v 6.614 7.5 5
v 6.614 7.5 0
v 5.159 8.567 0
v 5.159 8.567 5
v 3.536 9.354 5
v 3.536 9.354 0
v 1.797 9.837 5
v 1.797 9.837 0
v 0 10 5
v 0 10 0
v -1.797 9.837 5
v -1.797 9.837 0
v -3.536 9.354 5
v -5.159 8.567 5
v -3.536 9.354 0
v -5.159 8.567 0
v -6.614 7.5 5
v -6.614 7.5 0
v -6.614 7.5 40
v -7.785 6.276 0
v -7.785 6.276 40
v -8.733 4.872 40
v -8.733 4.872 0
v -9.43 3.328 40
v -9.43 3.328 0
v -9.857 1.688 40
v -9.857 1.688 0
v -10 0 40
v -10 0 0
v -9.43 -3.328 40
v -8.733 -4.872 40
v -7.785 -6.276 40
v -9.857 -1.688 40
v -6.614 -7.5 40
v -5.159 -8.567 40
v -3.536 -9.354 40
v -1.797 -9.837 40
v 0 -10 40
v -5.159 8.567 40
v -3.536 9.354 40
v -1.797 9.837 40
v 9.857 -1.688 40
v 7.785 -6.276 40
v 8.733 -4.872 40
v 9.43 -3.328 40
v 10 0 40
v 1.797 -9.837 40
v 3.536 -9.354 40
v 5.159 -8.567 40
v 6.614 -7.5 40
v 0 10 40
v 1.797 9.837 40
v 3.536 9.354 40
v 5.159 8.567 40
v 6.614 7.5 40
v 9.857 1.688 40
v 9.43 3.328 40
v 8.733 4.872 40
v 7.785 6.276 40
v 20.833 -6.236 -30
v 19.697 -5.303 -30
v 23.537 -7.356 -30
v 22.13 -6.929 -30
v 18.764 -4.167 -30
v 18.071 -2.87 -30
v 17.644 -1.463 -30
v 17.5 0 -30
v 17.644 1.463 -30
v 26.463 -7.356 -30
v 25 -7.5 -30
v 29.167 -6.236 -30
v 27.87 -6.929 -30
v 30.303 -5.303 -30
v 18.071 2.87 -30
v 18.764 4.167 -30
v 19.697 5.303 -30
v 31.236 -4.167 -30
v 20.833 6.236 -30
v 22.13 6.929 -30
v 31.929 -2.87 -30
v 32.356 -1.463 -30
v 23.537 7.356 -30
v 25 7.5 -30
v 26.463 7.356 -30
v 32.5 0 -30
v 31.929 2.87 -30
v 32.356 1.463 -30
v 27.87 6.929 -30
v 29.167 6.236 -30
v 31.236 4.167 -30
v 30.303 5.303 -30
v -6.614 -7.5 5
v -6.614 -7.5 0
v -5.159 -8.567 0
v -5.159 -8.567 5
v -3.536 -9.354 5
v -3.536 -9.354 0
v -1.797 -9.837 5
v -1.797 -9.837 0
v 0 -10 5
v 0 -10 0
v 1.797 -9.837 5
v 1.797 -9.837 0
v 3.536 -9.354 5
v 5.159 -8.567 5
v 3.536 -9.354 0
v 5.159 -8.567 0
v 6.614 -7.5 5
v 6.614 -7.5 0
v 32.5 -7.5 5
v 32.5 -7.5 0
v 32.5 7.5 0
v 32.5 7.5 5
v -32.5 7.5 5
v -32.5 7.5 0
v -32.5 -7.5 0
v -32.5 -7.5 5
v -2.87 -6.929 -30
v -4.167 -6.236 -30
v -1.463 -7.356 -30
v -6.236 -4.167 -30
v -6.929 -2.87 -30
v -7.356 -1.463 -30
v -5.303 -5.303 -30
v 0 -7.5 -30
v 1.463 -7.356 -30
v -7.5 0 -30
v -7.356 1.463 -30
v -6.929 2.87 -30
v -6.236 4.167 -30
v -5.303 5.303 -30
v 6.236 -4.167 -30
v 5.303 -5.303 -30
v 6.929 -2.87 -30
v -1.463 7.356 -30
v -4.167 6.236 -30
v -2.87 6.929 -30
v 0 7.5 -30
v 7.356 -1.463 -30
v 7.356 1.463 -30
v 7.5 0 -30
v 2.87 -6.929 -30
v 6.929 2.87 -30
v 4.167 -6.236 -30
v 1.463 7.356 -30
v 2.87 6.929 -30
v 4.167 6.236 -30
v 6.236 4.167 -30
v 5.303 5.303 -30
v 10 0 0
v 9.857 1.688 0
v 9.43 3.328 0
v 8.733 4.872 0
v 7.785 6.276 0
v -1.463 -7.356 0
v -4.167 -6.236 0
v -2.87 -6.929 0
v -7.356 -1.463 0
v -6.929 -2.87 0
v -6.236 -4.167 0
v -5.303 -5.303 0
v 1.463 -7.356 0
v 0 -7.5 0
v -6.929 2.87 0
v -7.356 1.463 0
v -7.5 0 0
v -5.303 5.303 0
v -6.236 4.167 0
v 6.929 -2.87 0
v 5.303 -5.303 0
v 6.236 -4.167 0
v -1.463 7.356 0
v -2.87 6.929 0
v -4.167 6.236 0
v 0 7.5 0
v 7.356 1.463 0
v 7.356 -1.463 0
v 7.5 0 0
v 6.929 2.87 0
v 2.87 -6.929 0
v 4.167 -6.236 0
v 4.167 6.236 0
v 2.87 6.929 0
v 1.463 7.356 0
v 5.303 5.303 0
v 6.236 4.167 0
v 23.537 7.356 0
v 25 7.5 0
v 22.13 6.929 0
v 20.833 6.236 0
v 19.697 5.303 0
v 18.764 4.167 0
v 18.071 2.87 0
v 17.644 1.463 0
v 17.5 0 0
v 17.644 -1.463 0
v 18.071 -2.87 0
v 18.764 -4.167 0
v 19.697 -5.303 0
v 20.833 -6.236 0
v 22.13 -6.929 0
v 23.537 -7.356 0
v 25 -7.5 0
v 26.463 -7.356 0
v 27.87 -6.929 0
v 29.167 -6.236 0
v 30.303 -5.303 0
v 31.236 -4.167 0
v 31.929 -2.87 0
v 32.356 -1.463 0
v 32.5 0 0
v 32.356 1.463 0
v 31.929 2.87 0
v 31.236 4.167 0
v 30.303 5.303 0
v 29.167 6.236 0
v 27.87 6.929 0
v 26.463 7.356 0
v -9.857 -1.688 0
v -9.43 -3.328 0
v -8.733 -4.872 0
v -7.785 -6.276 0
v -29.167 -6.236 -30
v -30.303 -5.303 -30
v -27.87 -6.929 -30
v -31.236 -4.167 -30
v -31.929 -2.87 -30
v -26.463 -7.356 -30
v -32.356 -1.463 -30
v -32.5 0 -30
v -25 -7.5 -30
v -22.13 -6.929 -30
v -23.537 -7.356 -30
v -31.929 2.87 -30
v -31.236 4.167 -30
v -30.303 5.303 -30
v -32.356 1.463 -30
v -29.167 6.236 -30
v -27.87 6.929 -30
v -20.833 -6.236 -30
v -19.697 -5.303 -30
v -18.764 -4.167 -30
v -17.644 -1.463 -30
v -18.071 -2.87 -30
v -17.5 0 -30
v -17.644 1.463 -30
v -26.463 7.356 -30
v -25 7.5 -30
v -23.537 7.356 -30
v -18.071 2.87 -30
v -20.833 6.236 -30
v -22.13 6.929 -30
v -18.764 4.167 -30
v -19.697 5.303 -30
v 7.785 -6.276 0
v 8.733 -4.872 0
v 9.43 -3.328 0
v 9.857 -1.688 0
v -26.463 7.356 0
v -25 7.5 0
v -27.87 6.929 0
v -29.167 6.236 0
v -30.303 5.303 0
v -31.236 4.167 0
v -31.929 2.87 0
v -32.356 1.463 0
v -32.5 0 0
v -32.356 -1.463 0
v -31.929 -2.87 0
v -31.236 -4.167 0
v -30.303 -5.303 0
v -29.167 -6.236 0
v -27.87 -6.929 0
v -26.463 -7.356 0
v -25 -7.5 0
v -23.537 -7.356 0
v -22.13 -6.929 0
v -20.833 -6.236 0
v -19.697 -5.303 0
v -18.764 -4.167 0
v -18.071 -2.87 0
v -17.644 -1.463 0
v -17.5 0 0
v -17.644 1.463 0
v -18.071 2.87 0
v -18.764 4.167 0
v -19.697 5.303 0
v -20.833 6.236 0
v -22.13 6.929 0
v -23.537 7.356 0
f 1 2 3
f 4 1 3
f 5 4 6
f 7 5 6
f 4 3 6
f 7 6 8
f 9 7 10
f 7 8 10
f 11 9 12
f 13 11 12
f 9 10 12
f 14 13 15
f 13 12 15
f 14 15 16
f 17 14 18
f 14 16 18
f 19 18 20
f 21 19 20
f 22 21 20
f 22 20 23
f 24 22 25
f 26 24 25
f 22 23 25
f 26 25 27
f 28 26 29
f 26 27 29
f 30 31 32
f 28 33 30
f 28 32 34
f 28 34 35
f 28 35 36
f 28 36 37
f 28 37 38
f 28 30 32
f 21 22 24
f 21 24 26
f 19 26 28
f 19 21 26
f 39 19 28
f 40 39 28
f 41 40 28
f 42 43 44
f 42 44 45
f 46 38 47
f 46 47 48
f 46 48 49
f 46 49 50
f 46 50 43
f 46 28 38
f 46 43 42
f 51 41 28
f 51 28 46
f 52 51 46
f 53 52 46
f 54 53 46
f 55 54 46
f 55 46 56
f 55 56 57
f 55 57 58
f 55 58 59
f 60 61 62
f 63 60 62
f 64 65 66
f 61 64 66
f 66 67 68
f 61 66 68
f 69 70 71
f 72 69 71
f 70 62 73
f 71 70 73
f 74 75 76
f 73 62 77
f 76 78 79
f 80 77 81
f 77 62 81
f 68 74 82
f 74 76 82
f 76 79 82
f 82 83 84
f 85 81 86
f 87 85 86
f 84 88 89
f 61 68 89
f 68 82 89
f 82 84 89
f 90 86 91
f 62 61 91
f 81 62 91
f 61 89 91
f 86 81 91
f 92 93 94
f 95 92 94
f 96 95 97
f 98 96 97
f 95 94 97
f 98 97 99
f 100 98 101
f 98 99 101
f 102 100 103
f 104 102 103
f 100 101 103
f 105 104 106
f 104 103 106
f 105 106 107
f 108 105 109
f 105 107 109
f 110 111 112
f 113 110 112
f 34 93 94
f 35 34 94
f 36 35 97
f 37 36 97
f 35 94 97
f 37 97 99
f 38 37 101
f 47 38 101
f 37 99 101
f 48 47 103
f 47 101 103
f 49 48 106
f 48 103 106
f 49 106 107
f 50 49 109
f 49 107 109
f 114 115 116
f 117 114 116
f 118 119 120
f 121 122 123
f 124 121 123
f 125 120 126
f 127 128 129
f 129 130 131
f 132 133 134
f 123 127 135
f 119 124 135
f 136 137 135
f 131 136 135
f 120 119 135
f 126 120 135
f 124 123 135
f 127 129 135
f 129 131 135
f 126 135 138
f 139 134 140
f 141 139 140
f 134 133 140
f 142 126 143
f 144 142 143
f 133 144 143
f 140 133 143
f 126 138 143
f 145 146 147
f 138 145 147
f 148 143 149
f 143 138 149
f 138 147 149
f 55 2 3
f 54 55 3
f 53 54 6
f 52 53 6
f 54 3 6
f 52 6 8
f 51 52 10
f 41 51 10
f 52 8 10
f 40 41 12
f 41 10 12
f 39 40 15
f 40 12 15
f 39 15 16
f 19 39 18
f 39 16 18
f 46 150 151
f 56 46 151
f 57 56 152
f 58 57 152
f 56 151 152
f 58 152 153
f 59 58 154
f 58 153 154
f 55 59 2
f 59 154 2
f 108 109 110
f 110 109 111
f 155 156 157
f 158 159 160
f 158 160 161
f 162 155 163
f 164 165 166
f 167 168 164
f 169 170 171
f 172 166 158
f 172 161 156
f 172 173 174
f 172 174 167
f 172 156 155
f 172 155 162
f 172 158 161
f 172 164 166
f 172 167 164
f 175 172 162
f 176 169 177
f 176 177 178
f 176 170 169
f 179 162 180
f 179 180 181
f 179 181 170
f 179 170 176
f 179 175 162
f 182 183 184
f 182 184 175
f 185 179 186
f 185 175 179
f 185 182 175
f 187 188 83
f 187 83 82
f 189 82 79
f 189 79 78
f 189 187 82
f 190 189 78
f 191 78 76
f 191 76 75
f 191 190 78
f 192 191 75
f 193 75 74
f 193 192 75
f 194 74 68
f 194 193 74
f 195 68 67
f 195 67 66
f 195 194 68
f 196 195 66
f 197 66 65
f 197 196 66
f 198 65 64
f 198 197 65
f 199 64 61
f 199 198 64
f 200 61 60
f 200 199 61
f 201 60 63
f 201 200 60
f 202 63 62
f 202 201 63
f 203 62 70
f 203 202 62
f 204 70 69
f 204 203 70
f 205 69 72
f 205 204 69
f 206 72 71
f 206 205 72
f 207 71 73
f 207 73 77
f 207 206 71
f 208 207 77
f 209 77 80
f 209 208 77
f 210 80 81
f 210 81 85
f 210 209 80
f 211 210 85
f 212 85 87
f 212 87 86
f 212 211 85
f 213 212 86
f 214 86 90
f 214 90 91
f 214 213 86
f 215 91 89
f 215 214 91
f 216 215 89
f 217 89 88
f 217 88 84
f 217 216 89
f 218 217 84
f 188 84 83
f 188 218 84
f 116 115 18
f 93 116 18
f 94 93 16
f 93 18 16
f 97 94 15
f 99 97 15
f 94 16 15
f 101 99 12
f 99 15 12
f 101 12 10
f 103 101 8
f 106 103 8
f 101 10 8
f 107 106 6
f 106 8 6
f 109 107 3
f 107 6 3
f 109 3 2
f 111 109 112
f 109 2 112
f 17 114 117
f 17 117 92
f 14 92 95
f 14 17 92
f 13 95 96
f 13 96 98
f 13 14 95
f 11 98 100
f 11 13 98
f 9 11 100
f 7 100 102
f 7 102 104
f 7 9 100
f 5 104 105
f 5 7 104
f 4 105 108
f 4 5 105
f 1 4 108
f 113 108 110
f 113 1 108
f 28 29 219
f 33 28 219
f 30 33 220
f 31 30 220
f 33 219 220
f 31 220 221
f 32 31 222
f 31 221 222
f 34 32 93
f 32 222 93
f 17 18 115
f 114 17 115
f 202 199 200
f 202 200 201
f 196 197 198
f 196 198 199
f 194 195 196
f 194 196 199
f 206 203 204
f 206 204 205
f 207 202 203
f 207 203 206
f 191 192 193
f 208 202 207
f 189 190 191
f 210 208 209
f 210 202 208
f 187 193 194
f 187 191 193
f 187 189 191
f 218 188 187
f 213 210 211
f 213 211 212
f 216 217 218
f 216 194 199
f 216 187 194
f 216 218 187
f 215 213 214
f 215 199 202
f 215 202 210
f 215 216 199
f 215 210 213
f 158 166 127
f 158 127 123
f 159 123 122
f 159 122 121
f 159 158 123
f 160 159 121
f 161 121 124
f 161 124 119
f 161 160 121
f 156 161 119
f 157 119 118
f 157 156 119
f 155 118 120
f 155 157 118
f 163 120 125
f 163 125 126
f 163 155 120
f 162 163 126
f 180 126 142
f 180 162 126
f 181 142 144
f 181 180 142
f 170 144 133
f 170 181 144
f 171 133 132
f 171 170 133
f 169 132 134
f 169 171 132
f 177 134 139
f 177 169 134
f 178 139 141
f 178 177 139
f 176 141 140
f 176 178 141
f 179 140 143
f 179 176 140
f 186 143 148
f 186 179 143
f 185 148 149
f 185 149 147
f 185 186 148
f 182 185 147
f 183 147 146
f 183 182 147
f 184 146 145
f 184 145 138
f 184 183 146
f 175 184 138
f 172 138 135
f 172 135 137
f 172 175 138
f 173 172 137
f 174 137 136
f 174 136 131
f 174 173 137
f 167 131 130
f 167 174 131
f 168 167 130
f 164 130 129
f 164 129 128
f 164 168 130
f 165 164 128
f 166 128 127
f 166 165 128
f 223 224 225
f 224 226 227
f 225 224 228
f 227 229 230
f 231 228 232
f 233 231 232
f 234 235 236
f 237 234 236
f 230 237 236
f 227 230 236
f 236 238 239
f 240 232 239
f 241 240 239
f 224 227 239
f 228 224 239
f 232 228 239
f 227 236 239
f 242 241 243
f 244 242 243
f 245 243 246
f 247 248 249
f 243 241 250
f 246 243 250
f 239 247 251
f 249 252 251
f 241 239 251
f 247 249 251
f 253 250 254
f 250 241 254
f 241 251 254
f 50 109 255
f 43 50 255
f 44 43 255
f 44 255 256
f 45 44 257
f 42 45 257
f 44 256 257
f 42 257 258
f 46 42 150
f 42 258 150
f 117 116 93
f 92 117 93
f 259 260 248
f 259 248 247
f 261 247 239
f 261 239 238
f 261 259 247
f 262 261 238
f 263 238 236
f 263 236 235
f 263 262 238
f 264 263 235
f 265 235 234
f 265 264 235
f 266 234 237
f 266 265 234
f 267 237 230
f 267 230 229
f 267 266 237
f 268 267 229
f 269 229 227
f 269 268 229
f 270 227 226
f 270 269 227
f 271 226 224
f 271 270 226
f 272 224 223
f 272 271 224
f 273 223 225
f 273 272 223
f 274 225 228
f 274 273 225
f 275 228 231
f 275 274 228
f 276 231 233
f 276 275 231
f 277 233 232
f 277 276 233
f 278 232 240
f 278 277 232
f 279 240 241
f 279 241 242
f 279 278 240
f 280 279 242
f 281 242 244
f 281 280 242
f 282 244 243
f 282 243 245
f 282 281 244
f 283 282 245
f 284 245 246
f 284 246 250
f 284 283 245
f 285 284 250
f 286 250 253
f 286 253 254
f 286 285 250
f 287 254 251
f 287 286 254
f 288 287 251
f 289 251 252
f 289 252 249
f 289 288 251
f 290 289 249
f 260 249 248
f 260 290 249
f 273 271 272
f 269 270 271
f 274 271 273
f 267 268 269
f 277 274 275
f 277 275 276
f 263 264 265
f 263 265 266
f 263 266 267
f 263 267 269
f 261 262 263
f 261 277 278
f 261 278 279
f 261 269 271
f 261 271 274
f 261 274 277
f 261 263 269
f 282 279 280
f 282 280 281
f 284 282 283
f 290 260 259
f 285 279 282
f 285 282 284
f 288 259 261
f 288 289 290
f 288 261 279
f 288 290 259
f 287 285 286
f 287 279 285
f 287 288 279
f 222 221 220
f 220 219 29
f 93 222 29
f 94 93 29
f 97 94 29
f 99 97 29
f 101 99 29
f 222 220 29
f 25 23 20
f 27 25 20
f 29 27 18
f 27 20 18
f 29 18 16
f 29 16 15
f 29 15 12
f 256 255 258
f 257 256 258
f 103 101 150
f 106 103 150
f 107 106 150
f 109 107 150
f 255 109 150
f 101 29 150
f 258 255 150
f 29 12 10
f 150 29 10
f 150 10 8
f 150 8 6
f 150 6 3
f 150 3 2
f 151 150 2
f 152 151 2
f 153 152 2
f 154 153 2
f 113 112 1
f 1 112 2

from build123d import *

# Parameters (mm, degrees)
F1_DEPTH = 5
F2_DEPTH = 40
F3_DEPTH = 30


with BuildPart() as f1:
    # F0 (on Top) → F1 (new body)
    with BuildSketch(Plane.XY):
        with BuildLine():
            Line((25, -7.5), (32.5, -7.5))
            Line((32.5, -7.5), (32.5, 0))
            ThreePointArc((32.5, 0), (30.3033008589, -5.3033008589), (25, -7.5))
        make_face()
        with BuildLine():
            Line((6.6143782777, -7.5), (25, -7.5))
            ThreePointArc((25, -7.5), (19.6966991411, -5.3033008589), (17.5, 0))
            Line((17.5, 0), (10, 0))
            ThreePointArc((10, 0), (9.1143782777, -4.1143782777), (6.6143782777, -7.5))
        make_face()
        with BuildLine():
            ThreePointArc((17.5, 0), (19.6966991411, -5.3033008589), (25, -7.5))
            ThreePointArc((25, -7.5), (30.3033008589, -5.3033008589), (32.5, 0))
            ThreePointArc((32.5, 0), (30.3033008589, 5.3033008589), (25, 7.5))
            ThreePointArc((25, 7.5), (19.6966991411, 5.3033008589), (17.5, 0))
        make_face()
        with BuildLine():
            ThreePointArc((25, 7.5), (30.3033008589, 5.3033008589), (32.5, 0))
            Line((32.5, 0), (32.5, 7.5))
            Line((32.5, 7.5), (25, 7.5))
        make_face()
        with BuildLine():
            ThreePointArc((-6.6143782777, -7.5), (0, -10), (6.6143782777, -7.5))
            Line((6.6143782777, -7.5), (-2.86e-08, -7.5))
            Line((-2.86e-08, -7.5), (-6.6143782777, -7.5))
        make_face()
        with BuildLine():
            Line((-2.86e-08, -7.5), (6.6143782777, -7.5))
            ThreePointArc((6.6143782777, -7.5), (9.1143782777, -4.1143782777), (10, 0))
            Line((10, 0), (7.5, 0))
            ThreePointArc((7.5, 0), (5.3033008488, -5.303300869), (-2.86e-08, -7.5))
        make_face()
        with BuildLine():
            Line((10, 0), (17.5, 0))
            ThreePointArc((17.5, 0), (19.6966991411, 5.3033008589), (25, 7.5))
            Line((25, 7.5), (6.6143782777, 7.5))
            ThreePointArc((6.6143782777, 7.5), (9.1143782777, 4.1143782777), (10, 0))
        make_face()
        with BuildLine():
            Line((-6.6143782777, -7.5), (-2.86e-08, -7.5))
            ThreePointArc((-2.86e-08, -7.5), (-5.303300869, -5.3033008488), (-7.5, 0))
            Line((-7.5, 0), (-10, 0))
            ThreePointArc((-10, 0), (-9.1143782777, -4.1143782777), (-6.6143782777, -7.5))
        make_face()
        with BuildLine():
            Line((-25, -7.5), (-6.6143782777, -7.5))
            ThreePointArc((-6.6143782777, -7.5), (-9.1143782777, -4.1143782777), (-10, 0))
            Line((-10, 0), (-17.5, 0))
            ThreePointArc((-17.5, 0), (-19.6966991411, -5.3033008589), (-25, -7.5))
        make_face()
        with BuildLine():
            Line((7.5, 0), (10, 0))
            ThreePointArc((10, 0), (9.1143782777, 4.1143782777), (6.6143782777, 7.5))
            Line((6.6143782777, 7.5), (0, 7.5))
            ThreePointArc((0, 7.5), (5.3033008589, 5.3033008589), (7.5, 0))
        make_face()
        with BuildLine():
            Line((0, 7.5), (6.6143782777, 7.5))
            ThreePointArc((6.6143782777, 7.5), (0, 10), (-6.6143782777, 7.5))
            Line((-6.6143782777, 7.5), (0, 7.5))
        make_face()
        with BuildLine():
            Line((-10, 0), (-7.5, 0))
            ThreePointArc((-7.5, 0), (-5.3033008589, 5.3033008589), (0, 7.5))
            Line((0, 7.5), (-6.6143782777, 7.5))
            ThreePointArc((-6.6143782777, 7.5), (-9.1143782777, 4.1143782777), (-10, 0))
        make_face()
        with BuildLine():
            Line((-32.5, -7.5), (-25, -7.5))
            ThreePointArc((-25, -7.5), (-30.3033008589, -5.3033008589), (-32.5, 0))
            Line((-32.5, 0), (-32.5, -7.5))
        make_face()
        with BuildLine():
            ThreePointArc((-32.5, 0), (-30.3033008589, -5.3033008589), (-25, -7.5))
            ThreePointArc((-25, -7.5), (-19.6966991411, -5.3033008589), (-17.5, 0))
            ThreePointArc((-17.5, 0), (-19.6966991411, 5.3033008589), (-25, 7.5))
            ThreePointArc((-25, 7.5), (-30.3033008589, 5.3033008589), (-32.5, 0))
        make_face()
        with BuildLine():
            Line((-17.5, 0), (-10, 0))
            ThreePointArc((-10, 0), (-9.1143782777, 4.1143782777), (-6.6143782777, 7.5))
            Line((-6.6143782777, 7.5), (-25, 7.5))
            ThreePointArc((-25, 7.5), (-19.6966991411, 5.3033008589), (-17.5, 0))
        make_face()
        with BuildLine():
            Line((-32.5, 7.5), (-32.5, 0))
            ThreePointArc((-32.5, 0), (-30.3033008589, 5.3033008589), (-25, 7.5))
            Line((-25, 7.5), (-32.5, 7.5))
        make_face()
        with BuildLine():
            ThreePointArc((0, 7.5), (-5.3033008589, 5.3033008589), (-7.5, 0))
            Line((-7.5, 0), (0, 0))
            Line((0, 0), (7.5, 0))
            ThreePointArc((7.5, 0), (5.3033008589, 5.3033008589), (0, 7.5))
        make_face()
        with BuildLine():
            ThreePointArc((-7.5, 0), (-5.303300869, -5.3033008488), (-2.86e-08, -7.5))
            ThreePointArc((-2.86e-08, -7.5), (5.3033008488, -5.303300869), (7.5, 0))
            Line((7.5, 0), (0, 0))
            Line((0, 0), (-7.5, 0))
        make_face()
    extrude(amount=F1_DEPTH)


with BuildPart() as f2:
    # F0 (on Top) → F2 (new body)
    with BuildSketch(Plane.XY):
        with BuildLine():
            Line((0, 7.5), (6.6143782777, 7.5))
            ThreePointArc((6.6143782777, 7.5), (0, 10), (-6.6143782777, 7.5))
            Line((-6.6143782777, 7.5), (0, 7.5))
        make_face()
        with BuildLine():
            Line((-10, 0), (-7.5, 0))
            ThreePointArc((-7.5, 0), (-5.3033008589, 5.3033008589), (0, 7.5))
            Line((0, 7.5), (-6.6143782777, 7.5))
            ThreePointArc((-6.6143782777, 7.5), (-9.1143782777, 4.1143782777), (-10, 0))
        make_face()
        with BuildLine():
            ThreePointArc((0, 7.5), (-5.3033008589, 5.3033008589), (-7.5, 0))
            Line((-7.5, 0), (0, 0))
            Line((0, 0), (7.5, 0))
            ThreePointArc((7.5, 0), (5.3033008589, 5.3033008589), (0, 7.5))
        make_face()
        with BuildLine():
            Line((7.5, 0), (10, 0))
            ThreePointArc((10, 0), (9.1143782777, 4.1143782777), (6.6143782777, 7.5))
            Line((6.6143782777, 7.5), (0, 7.5))
            ThreePointArc((0, 7.5), (5.3033008589, 5.3033008589), (7.5, 0))
        make_face()
        with BuildLine():
            ThreePointArc((-7.5, 0), (-5.303300869, -5.3033008488), (-2.86e-08, -7.5))
            ThreePointArc((-2.86e-08, -7.5), (5.3033008488, -5.303300869), (7.5, 0))
            Line((7.5, 0), (0, 0))
            Line((0, 0), (-7.5, 0))
        make_face()
        with BuildLine():
            ThreePointArc((-6.6143782777, -7.5), (0, -10), (6.6143782777, -7.5))
            Line((6.6143782777, -7.5), (-2.86e-08, -7.5))
            Line((-2.86e-08, -7.5), (-6.6143782777, -7.5))
        make_face()
        with BuildLine():
            Line((-2.86e-08, -7.5), (6.6143782777, -7.5))
            ThreePointArc((6.6143782777, -7.5), (9.1143782777, -4.1143782777), (10, 0))
            Line((10, 0), (7.5, 0))
            ThreePointArc((7.5, 0), (5.3033008488, -5.303300869), (-2.86e-08, -7.5))
        make_face()
        with BuildLine():
            Line((-6.6143782777, -7.5), (-2.86e-08, -7.5))
            ThreePointArc((-2.86e-08, -7.5), (-5.303300869, -5.3033008488), (-7.5, 0))
            Line((-7.5, 0), (-10, 0))
            ThreePointArc((-10, 0), (-9.1143782777, -4.1143782777), (-6.6143782777, -7.5))
        make_face()
    extrude(amount=F2_DEPTH)


with BuildPart() as f3:
    # F0 (on Top) → F3 (new body)
    with BuildSketch(Plane.XY):
        with BuildLine():
            ThreePointArc((-32.5, 0), (-30.3033008589, -5.3033008589), (-25, -7.5))
            ThreePointArc((-25, -7.5), (-19.6966991411, -5.3033008589), (-17.5, 0))
            ThreePointArc((-17.5, 0), (-19.6966991411, 5.3033008589), (-25, 7.5))
            ThreePointArc((-25, 7.5), (-30.3033008589, 5.3033008589), (-32.5, 0))
        make_face()
    extrude(amount=-F3_DEPTH)


with BuildPart() as f3b:
    # F0 (on Top) → F3, piece 2 (new body)
    with BuildSketch(Plane.XY):
        with BuildLine():
            ThreePointArc((0, 7.5), (-5.3033008589, 5.3033008589), (-7.5, 0))
            Line((-7.5, 0), (0, 0))
            Line((0, 0), (7.5, 0))
            ThreePointArc((7.5, 0), (5.3033008589, 5.3033008589), (0, 7.5))
        make_face()
        with BuildLine():
            ThreePointArc((-7.5, 0), (-5.303300869, -5.3033008488), (-2.86e-08, -7.5))
            ThreePointArc((-2.86e-08, -7.5), (5.3033008488, -5.303300869), (7.5, 0))
            Line((7.5, 0), (0, 0))
            Line((0, 0), (-7.5, 0))
        make_face()
    extrude(amount=-F3_DEPTH)


with BuildPart() as f3c:
    # F0 (on Top) → F3, piece 3 (new body)
    with BuildSketch(Plane.XY):
        with BuildLine():
            ThreePointArc((17.5, 0), (19.6966991411, -5.3033008589), (25, -7.5))
            ThreePointArc((25, -7.5), (30.3033008589, -5.3033008589), (32.5, 0))
            ThreePointArc((32.5, 0), (30.3033008589, 5.3033008589), (25, 7.5))
            ThreePointArc((25, 7.5), (19.6966991411, 5.3033008589), (17.5, 0))
        make_face()
    extrude(amount=-F3_DEPTH)


solid = Compound([f1.part, f2.part, f3.part, f3b.part, f3c.part])
